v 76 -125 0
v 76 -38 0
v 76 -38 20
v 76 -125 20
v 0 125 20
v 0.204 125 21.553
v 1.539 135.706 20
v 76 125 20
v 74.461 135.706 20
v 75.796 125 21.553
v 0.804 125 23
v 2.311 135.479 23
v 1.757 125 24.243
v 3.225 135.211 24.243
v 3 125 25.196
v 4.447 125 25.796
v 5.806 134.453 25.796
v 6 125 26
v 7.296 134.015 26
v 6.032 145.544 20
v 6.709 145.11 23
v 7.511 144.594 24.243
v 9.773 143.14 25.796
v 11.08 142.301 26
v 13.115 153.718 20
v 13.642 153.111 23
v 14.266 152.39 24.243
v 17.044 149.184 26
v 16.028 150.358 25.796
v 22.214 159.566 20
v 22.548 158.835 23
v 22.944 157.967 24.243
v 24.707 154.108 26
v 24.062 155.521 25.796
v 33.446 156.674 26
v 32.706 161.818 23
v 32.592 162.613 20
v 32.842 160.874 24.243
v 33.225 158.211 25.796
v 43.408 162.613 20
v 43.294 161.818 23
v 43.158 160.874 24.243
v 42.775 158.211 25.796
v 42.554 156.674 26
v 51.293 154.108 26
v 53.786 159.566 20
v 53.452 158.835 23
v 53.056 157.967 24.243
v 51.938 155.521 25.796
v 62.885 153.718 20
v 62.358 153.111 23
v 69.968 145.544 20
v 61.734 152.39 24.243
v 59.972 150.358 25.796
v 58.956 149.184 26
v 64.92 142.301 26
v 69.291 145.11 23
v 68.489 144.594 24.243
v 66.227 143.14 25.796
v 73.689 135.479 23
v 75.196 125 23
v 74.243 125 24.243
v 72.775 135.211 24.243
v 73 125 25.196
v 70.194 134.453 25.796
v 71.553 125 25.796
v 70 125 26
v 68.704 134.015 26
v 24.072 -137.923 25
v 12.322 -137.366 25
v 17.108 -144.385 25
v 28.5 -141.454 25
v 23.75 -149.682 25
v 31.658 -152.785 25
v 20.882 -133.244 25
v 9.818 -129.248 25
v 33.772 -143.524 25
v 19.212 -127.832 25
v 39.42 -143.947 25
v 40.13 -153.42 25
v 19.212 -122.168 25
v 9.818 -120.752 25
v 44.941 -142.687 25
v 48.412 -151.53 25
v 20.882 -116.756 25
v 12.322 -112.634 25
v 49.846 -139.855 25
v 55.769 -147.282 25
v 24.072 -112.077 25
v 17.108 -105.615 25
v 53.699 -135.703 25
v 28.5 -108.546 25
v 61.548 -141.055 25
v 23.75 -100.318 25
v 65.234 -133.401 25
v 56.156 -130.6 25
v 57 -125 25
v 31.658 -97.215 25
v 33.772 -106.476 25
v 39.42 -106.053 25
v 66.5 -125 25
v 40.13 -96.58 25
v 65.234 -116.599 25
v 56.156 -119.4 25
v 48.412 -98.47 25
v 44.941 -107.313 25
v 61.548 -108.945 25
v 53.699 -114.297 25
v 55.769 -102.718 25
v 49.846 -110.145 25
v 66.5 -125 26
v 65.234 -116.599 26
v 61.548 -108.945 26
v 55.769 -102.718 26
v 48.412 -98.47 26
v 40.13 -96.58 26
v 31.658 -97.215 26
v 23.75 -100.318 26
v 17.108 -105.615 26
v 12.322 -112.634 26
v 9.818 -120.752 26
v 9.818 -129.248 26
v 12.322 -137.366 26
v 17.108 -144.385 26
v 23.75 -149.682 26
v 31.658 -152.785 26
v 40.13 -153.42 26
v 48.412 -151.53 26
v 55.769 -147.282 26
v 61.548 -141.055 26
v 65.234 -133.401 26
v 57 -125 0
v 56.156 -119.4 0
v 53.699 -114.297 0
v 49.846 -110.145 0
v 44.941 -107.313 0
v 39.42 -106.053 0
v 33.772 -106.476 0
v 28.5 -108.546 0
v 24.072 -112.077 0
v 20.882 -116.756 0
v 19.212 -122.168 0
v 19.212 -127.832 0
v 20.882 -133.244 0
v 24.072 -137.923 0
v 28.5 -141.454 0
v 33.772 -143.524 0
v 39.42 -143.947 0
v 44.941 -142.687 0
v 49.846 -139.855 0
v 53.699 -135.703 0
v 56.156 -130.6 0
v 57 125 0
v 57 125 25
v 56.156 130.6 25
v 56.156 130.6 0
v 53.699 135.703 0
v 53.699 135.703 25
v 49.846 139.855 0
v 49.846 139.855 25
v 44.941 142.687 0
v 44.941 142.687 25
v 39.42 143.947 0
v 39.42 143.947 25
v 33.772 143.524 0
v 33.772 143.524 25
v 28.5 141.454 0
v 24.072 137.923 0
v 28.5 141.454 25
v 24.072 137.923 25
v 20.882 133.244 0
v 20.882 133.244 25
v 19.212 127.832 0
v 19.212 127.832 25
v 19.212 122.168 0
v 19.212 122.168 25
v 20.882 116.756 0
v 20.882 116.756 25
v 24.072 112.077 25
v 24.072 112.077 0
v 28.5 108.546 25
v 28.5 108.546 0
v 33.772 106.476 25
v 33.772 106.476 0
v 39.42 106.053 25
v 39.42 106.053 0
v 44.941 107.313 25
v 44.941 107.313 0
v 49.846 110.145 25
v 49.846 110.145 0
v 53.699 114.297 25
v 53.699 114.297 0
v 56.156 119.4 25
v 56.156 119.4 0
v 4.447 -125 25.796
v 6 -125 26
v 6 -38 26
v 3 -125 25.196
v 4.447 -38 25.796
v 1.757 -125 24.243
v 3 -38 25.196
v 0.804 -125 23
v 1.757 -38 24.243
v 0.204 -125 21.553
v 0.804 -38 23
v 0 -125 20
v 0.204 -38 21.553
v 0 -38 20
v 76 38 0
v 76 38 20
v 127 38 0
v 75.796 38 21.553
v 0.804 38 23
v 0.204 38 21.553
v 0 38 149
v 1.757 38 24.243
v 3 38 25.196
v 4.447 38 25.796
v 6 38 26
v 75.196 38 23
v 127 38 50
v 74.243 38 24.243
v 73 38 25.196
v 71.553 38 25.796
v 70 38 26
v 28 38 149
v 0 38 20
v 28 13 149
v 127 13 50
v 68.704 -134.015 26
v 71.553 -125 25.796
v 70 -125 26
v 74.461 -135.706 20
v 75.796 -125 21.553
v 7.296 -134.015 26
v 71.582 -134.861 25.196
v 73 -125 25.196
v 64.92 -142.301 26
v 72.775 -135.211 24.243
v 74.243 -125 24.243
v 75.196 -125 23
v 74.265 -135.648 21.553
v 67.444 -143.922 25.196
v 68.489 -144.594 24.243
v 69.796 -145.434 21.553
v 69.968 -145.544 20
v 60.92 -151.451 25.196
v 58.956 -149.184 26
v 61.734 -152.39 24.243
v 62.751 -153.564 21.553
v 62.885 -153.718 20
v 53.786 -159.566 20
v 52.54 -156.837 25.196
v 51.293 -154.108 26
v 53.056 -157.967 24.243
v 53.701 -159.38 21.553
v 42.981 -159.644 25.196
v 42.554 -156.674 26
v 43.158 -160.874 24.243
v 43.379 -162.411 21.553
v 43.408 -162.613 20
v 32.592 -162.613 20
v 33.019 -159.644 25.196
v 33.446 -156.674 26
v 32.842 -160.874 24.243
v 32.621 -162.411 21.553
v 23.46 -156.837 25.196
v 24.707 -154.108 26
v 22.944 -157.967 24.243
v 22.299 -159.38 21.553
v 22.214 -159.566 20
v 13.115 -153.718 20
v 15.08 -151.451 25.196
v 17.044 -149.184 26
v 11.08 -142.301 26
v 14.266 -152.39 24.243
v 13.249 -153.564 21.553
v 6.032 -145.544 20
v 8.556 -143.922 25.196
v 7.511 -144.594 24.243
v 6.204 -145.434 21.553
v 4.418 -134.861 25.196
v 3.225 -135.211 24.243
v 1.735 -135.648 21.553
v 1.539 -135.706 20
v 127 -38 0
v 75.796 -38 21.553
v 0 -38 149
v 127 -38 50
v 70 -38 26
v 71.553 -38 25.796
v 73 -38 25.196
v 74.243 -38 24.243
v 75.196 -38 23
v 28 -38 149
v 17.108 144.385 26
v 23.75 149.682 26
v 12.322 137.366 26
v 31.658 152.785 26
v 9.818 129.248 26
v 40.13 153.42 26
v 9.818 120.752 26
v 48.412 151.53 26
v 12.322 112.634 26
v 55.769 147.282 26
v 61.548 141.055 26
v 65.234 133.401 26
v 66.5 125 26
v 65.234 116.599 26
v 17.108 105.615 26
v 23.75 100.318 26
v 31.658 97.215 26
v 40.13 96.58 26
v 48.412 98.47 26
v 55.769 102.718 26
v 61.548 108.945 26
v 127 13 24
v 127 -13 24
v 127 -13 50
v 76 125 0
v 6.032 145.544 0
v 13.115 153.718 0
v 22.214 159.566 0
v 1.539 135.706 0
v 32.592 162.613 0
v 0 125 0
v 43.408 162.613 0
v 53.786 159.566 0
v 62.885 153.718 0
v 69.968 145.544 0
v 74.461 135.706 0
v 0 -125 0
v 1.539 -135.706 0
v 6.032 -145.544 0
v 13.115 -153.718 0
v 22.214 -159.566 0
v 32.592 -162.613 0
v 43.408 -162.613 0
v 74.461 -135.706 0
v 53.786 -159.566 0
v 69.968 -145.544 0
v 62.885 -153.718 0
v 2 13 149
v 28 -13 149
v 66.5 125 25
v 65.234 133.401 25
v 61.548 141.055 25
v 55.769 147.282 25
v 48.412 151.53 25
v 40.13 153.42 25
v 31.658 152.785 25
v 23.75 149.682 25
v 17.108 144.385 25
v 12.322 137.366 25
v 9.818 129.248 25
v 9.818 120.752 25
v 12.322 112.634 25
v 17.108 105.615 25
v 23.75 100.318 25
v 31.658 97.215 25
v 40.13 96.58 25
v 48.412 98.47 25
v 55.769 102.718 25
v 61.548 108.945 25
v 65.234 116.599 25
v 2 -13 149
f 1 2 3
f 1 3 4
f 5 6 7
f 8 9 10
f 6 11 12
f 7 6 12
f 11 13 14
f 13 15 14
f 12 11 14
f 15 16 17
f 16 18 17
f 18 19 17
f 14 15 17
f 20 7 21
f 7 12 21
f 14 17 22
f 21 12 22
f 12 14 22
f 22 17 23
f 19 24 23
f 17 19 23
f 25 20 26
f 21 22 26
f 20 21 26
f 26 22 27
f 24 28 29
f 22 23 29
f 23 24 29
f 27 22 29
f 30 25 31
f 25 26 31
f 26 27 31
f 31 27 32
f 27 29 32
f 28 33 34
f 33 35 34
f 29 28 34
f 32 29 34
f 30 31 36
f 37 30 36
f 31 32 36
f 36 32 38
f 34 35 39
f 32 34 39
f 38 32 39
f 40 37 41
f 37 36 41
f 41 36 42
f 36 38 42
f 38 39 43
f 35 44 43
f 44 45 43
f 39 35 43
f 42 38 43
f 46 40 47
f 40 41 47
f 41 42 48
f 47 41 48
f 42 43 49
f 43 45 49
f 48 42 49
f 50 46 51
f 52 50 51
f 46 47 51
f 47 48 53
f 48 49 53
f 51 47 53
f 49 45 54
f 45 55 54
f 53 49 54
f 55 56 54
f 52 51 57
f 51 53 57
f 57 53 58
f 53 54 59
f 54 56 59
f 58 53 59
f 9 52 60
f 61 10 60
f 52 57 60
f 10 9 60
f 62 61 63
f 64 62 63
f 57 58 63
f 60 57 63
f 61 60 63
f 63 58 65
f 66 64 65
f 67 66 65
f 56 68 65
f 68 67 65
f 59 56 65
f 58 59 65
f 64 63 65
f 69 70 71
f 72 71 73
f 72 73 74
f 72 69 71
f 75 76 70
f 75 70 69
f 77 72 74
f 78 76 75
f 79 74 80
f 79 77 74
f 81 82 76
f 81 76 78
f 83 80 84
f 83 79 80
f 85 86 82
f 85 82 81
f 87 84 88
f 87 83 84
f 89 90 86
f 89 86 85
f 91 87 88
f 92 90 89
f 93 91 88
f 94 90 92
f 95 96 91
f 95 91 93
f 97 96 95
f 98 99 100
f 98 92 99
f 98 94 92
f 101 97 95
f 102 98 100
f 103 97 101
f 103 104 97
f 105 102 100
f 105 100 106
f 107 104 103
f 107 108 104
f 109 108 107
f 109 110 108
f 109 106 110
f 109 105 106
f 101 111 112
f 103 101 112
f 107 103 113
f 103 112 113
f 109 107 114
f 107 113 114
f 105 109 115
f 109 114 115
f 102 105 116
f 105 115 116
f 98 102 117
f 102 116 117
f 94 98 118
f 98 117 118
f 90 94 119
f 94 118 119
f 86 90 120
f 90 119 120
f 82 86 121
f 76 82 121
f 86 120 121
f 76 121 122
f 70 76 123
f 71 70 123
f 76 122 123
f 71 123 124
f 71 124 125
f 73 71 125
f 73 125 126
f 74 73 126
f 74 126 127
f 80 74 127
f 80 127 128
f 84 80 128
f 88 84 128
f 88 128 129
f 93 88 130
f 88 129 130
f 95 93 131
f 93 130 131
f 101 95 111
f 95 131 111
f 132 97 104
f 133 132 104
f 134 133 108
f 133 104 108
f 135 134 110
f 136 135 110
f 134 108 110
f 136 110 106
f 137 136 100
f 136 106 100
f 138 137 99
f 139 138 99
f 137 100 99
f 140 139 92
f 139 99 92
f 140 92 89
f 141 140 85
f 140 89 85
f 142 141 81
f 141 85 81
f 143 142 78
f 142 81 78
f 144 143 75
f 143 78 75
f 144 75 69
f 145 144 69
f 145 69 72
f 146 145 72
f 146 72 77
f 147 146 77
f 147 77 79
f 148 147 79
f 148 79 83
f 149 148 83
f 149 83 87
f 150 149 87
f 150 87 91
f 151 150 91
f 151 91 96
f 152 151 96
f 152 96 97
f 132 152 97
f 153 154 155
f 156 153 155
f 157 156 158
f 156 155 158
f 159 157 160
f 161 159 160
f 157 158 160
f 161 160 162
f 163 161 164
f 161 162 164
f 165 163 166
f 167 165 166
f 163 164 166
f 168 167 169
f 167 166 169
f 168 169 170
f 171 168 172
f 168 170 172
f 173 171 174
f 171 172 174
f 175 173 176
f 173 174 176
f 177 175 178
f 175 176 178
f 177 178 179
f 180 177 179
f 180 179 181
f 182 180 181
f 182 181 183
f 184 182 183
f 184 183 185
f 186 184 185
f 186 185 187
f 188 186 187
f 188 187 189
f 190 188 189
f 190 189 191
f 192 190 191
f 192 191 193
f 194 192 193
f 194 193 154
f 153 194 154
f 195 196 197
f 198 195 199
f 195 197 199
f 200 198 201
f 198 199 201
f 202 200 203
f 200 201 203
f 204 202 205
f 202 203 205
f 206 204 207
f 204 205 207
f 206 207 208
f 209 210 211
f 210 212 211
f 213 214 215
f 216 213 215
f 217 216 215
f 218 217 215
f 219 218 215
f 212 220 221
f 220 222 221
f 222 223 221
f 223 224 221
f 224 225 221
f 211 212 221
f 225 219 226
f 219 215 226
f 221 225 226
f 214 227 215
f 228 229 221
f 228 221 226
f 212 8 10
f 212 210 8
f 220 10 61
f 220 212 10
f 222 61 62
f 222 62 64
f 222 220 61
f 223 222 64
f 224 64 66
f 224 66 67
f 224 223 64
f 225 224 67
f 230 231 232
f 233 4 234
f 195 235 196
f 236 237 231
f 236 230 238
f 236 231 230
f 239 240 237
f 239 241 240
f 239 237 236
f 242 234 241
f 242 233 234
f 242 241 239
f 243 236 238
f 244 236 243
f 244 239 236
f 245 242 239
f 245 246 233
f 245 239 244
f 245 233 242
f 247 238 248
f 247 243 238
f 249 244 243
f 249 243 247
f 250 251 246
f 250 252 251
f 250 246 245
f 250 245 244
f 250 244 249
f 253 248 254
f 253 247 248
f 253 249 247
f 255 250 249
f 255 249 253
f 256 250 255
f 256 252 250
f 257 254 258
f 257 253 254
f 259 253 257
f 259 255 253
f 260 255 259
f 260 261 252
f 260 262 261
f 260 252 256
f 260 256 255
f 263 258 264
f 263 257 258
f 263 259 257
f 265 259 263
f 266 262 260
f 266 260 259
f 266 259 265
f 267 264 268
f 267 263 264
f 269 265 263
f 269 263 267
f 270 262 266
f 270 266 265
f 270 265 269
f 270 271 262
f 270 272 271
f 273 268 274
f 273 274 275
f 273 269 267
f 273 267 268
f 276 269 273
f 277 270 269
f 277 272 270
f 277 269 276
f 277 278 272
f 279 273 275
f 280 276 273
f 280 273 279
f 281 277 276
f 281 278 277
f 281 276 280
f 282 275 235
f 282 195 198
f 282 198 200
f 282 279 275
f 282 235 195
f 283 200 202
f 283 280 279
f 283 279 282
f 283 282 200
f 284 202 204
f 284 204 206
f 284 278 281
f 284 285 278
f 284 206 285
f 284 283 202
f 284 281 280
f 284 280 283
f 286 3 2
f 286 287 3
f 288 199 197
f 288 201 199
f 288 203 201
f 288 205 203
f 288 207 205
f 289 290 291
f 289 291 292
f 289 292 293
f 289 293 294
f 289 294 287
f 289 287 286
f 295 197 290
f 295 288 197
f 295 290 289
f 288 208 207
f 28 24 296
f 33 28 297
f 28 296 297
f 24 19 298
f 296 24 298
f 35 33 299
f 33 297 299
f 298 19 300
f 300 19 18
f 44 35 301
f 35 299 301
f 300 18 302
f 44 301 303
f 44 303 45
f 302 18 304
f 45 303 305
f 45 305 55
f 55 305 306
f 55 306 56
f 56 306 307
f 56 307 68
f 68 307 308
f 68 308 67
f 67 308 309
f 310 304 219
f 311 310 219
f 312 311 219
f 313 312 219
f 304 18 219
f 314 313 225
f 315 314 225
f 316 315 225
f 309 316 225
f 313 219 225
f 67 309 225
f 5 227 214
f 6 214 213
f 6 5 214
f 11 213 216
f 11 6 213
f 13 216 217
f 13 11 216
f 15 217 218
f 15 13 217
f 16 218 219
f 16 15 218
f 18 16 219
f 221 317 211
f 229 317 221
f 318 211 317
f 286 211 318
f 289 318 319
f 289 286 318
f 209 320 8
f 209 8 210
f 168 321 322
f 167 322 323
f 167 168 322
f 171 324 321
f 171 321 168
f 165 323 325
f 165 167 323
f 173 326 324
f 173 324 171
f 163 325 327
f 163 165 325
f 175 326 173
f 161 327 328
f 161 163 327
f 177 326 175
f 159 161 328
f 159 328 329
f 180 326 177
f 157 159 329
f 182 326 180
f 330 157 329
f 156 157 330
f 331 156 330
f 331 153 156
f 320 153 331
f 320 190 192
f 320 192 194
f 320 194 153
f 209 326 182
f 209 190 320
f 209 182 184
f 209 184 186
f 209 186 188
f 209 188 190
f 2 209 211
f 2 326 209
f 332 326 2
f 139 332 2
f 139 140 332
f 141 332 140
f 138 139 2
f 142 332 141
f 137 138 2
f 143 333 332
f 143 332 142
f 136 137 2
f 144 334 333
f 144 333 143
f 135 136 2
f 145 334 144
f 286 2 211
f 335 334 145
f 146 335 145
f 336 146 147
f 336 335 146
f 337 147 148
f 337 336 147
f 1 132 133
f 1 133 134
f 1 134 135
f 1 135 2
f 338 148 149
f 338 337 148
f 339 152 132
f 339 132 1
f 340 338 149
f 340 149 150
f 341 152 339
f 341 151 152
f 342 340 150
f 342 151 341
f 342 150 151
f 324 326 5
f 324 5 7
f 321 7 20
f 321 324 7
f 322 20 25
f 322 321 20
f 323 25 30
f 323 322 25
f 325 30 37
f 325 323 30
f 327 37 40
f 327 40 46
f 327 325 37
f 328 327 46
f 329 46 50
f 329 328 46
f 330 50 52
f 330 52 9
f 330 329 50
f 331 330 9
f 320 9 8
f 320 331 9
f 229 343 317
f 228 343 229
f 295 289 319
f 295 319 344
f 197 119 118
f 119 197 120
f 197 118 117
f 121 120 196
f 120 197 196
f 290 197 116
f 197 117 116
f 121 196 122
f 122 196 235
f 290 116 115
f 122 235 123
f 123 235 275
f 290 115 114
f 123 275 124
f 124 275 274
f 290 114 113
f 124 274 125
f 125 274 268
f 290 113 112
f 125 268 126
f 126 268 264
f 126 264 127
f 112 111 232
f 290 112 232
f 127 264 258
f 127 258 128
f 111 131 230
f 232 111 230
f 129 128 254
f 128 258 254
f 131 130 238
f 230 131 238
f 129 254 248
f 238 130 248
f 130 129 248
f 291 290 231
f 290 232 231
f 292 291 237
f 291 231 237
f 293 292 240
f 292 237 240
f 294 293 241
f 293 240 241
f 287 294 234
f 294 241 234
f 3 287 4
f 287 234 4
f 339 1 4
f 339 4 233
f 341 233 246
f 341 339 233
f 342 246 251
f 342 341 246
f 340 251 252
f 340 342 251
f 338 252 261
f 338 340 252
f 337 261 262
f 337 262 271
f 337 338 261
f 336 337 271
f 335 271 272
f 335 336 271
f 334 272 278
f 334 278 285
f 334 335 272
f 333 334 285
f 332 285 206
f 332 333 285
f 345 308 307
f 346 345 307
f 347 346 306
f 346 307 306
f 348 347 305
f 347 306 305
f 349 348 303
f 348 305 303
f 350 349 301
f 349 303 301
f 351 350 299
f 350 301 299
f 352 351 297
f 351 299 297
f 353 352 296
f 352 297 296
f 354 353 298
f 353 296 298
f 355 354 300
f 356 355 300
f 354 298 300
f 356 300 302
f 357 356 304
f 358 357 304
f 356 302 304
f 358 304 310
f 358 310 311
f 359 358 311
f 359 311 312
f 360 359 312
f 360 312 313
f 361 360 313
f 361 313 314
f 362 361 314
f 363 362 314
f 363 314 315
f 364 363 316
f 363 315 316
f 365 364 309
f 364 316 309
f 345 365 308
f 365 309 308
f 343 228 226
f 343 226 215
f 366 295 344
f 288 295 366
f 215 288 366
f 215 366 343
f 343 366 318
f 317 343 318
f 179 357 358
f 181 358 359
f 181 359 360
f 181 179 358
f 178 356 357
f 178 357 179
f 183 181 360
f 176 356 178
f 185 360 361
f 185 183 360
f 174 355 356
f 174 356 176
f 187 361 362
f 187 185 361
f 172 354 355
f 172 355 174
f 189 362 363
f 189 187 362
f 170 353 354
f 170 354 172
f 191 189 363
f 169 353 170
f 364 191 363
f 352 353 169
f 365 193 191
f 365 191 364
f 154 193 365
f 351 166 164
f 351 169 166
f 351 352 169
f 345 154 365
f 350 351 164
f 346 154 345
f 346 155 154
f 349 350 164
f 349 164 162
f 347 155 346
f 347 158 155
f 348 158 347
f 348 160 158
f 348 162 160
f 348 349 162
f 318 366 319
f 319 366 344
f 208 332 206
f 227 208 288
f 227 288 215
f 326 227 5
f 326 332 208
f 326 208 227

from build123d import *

# Parameters (mm, degrees)
F1_DEPTH  = 38
F4_DEPTH  = 13
F5_DEPTH  = 26
F6_R      = 19
F7_DEPTH  = 26.001
F8_R      = 28.5
F9_DEPTH  = 1
F10_R     = 19
F11_DEPTH = 26.001
F12_R     = 28.5
F13_DEPTH = 1
F14_R     = 6


with BuildPart() as f1:
    # F0 (on Front) → F1 (new body, symmetric)
    with BuildSketch(Plane.XZ):
        Polygon((0, 149), (0, 0), (127, 0), (127, 50), (28, 149), align=None)
    extrude(amount=F1_DEPTH, both=True)

    # F3 (on Front) → F4 (cut, symmetric)
    with BuildSketch(Plane.XZ):
        Polygon((127, 50), (28, 149), (2, 149), (127, 24), align=None)
    extrude(amount=F4_DEPTH, both=True, mode=Mode.SUBTRACT)

    # F2 (on face) → F5 (join)
    with BuildSketch(Plane(origin=(0, 0, 0), x_dir=(1, 0, 0), z_dir=(0, 0, -1))):
        with BuildLine():
            ThreePointArc((0, -125), (38, -163), (76, -125))
            Line((76, -125), (76, 125))
            ThreePointArc((76, 125), (38, 163), (0, 125))
            Line((0, 125), (0, -125))
        make_face()
    extrude(amount=-F5_DEPTH)

    # F6 (on face) → F7 (cut, through all)
    with BuildSketch(Plane.XY.offset(26)):
        with Locations((38, -125)):
            Circle(F6_R)
    extrude(amount=-F7_DEPTH, mode=Mode.SUBTRACT)

    # F8 (on face) → F9 (cut)
    with BuildSketch(Plane.XY.offset(26)):
        with Locations((38, -125)):
            Circle(F8_R)
    extrude(amount=-F9_DEPTH, mode=Mode.SUBTRACT)

    # F10 (on face) → F11 (cut, through all)
    with BuildSketch(Plane.XY.offset(26)):
        with Locations((38, 125)):
            Circle(F10_R)
    extrude(amount=-F11_DEPTH, mode=Mode.SUBTRACT)

    # F12 (on face) → F13 (cut)
    with BuildSketch(Plane.XY.offset(26)):
        with Locations((38, 125)):
            Circle(F12_R)
    extrude(amount=-F13_DEPTH, mode=Mode.SUBTRACT)

    # F14
    f14_edges = [f1.edges().sort_by_distance(p)[0] for p in [
        (76, -81.5, 26),
        (76, 81.5, 26),
        (0, 81.5, 26),
        (0, -81.5, 26),
        (38, -163, 26),
        (38, 163, 26),
    ]]
    fillet(f14_edges, radius=F14_R)


solid = f1.part
